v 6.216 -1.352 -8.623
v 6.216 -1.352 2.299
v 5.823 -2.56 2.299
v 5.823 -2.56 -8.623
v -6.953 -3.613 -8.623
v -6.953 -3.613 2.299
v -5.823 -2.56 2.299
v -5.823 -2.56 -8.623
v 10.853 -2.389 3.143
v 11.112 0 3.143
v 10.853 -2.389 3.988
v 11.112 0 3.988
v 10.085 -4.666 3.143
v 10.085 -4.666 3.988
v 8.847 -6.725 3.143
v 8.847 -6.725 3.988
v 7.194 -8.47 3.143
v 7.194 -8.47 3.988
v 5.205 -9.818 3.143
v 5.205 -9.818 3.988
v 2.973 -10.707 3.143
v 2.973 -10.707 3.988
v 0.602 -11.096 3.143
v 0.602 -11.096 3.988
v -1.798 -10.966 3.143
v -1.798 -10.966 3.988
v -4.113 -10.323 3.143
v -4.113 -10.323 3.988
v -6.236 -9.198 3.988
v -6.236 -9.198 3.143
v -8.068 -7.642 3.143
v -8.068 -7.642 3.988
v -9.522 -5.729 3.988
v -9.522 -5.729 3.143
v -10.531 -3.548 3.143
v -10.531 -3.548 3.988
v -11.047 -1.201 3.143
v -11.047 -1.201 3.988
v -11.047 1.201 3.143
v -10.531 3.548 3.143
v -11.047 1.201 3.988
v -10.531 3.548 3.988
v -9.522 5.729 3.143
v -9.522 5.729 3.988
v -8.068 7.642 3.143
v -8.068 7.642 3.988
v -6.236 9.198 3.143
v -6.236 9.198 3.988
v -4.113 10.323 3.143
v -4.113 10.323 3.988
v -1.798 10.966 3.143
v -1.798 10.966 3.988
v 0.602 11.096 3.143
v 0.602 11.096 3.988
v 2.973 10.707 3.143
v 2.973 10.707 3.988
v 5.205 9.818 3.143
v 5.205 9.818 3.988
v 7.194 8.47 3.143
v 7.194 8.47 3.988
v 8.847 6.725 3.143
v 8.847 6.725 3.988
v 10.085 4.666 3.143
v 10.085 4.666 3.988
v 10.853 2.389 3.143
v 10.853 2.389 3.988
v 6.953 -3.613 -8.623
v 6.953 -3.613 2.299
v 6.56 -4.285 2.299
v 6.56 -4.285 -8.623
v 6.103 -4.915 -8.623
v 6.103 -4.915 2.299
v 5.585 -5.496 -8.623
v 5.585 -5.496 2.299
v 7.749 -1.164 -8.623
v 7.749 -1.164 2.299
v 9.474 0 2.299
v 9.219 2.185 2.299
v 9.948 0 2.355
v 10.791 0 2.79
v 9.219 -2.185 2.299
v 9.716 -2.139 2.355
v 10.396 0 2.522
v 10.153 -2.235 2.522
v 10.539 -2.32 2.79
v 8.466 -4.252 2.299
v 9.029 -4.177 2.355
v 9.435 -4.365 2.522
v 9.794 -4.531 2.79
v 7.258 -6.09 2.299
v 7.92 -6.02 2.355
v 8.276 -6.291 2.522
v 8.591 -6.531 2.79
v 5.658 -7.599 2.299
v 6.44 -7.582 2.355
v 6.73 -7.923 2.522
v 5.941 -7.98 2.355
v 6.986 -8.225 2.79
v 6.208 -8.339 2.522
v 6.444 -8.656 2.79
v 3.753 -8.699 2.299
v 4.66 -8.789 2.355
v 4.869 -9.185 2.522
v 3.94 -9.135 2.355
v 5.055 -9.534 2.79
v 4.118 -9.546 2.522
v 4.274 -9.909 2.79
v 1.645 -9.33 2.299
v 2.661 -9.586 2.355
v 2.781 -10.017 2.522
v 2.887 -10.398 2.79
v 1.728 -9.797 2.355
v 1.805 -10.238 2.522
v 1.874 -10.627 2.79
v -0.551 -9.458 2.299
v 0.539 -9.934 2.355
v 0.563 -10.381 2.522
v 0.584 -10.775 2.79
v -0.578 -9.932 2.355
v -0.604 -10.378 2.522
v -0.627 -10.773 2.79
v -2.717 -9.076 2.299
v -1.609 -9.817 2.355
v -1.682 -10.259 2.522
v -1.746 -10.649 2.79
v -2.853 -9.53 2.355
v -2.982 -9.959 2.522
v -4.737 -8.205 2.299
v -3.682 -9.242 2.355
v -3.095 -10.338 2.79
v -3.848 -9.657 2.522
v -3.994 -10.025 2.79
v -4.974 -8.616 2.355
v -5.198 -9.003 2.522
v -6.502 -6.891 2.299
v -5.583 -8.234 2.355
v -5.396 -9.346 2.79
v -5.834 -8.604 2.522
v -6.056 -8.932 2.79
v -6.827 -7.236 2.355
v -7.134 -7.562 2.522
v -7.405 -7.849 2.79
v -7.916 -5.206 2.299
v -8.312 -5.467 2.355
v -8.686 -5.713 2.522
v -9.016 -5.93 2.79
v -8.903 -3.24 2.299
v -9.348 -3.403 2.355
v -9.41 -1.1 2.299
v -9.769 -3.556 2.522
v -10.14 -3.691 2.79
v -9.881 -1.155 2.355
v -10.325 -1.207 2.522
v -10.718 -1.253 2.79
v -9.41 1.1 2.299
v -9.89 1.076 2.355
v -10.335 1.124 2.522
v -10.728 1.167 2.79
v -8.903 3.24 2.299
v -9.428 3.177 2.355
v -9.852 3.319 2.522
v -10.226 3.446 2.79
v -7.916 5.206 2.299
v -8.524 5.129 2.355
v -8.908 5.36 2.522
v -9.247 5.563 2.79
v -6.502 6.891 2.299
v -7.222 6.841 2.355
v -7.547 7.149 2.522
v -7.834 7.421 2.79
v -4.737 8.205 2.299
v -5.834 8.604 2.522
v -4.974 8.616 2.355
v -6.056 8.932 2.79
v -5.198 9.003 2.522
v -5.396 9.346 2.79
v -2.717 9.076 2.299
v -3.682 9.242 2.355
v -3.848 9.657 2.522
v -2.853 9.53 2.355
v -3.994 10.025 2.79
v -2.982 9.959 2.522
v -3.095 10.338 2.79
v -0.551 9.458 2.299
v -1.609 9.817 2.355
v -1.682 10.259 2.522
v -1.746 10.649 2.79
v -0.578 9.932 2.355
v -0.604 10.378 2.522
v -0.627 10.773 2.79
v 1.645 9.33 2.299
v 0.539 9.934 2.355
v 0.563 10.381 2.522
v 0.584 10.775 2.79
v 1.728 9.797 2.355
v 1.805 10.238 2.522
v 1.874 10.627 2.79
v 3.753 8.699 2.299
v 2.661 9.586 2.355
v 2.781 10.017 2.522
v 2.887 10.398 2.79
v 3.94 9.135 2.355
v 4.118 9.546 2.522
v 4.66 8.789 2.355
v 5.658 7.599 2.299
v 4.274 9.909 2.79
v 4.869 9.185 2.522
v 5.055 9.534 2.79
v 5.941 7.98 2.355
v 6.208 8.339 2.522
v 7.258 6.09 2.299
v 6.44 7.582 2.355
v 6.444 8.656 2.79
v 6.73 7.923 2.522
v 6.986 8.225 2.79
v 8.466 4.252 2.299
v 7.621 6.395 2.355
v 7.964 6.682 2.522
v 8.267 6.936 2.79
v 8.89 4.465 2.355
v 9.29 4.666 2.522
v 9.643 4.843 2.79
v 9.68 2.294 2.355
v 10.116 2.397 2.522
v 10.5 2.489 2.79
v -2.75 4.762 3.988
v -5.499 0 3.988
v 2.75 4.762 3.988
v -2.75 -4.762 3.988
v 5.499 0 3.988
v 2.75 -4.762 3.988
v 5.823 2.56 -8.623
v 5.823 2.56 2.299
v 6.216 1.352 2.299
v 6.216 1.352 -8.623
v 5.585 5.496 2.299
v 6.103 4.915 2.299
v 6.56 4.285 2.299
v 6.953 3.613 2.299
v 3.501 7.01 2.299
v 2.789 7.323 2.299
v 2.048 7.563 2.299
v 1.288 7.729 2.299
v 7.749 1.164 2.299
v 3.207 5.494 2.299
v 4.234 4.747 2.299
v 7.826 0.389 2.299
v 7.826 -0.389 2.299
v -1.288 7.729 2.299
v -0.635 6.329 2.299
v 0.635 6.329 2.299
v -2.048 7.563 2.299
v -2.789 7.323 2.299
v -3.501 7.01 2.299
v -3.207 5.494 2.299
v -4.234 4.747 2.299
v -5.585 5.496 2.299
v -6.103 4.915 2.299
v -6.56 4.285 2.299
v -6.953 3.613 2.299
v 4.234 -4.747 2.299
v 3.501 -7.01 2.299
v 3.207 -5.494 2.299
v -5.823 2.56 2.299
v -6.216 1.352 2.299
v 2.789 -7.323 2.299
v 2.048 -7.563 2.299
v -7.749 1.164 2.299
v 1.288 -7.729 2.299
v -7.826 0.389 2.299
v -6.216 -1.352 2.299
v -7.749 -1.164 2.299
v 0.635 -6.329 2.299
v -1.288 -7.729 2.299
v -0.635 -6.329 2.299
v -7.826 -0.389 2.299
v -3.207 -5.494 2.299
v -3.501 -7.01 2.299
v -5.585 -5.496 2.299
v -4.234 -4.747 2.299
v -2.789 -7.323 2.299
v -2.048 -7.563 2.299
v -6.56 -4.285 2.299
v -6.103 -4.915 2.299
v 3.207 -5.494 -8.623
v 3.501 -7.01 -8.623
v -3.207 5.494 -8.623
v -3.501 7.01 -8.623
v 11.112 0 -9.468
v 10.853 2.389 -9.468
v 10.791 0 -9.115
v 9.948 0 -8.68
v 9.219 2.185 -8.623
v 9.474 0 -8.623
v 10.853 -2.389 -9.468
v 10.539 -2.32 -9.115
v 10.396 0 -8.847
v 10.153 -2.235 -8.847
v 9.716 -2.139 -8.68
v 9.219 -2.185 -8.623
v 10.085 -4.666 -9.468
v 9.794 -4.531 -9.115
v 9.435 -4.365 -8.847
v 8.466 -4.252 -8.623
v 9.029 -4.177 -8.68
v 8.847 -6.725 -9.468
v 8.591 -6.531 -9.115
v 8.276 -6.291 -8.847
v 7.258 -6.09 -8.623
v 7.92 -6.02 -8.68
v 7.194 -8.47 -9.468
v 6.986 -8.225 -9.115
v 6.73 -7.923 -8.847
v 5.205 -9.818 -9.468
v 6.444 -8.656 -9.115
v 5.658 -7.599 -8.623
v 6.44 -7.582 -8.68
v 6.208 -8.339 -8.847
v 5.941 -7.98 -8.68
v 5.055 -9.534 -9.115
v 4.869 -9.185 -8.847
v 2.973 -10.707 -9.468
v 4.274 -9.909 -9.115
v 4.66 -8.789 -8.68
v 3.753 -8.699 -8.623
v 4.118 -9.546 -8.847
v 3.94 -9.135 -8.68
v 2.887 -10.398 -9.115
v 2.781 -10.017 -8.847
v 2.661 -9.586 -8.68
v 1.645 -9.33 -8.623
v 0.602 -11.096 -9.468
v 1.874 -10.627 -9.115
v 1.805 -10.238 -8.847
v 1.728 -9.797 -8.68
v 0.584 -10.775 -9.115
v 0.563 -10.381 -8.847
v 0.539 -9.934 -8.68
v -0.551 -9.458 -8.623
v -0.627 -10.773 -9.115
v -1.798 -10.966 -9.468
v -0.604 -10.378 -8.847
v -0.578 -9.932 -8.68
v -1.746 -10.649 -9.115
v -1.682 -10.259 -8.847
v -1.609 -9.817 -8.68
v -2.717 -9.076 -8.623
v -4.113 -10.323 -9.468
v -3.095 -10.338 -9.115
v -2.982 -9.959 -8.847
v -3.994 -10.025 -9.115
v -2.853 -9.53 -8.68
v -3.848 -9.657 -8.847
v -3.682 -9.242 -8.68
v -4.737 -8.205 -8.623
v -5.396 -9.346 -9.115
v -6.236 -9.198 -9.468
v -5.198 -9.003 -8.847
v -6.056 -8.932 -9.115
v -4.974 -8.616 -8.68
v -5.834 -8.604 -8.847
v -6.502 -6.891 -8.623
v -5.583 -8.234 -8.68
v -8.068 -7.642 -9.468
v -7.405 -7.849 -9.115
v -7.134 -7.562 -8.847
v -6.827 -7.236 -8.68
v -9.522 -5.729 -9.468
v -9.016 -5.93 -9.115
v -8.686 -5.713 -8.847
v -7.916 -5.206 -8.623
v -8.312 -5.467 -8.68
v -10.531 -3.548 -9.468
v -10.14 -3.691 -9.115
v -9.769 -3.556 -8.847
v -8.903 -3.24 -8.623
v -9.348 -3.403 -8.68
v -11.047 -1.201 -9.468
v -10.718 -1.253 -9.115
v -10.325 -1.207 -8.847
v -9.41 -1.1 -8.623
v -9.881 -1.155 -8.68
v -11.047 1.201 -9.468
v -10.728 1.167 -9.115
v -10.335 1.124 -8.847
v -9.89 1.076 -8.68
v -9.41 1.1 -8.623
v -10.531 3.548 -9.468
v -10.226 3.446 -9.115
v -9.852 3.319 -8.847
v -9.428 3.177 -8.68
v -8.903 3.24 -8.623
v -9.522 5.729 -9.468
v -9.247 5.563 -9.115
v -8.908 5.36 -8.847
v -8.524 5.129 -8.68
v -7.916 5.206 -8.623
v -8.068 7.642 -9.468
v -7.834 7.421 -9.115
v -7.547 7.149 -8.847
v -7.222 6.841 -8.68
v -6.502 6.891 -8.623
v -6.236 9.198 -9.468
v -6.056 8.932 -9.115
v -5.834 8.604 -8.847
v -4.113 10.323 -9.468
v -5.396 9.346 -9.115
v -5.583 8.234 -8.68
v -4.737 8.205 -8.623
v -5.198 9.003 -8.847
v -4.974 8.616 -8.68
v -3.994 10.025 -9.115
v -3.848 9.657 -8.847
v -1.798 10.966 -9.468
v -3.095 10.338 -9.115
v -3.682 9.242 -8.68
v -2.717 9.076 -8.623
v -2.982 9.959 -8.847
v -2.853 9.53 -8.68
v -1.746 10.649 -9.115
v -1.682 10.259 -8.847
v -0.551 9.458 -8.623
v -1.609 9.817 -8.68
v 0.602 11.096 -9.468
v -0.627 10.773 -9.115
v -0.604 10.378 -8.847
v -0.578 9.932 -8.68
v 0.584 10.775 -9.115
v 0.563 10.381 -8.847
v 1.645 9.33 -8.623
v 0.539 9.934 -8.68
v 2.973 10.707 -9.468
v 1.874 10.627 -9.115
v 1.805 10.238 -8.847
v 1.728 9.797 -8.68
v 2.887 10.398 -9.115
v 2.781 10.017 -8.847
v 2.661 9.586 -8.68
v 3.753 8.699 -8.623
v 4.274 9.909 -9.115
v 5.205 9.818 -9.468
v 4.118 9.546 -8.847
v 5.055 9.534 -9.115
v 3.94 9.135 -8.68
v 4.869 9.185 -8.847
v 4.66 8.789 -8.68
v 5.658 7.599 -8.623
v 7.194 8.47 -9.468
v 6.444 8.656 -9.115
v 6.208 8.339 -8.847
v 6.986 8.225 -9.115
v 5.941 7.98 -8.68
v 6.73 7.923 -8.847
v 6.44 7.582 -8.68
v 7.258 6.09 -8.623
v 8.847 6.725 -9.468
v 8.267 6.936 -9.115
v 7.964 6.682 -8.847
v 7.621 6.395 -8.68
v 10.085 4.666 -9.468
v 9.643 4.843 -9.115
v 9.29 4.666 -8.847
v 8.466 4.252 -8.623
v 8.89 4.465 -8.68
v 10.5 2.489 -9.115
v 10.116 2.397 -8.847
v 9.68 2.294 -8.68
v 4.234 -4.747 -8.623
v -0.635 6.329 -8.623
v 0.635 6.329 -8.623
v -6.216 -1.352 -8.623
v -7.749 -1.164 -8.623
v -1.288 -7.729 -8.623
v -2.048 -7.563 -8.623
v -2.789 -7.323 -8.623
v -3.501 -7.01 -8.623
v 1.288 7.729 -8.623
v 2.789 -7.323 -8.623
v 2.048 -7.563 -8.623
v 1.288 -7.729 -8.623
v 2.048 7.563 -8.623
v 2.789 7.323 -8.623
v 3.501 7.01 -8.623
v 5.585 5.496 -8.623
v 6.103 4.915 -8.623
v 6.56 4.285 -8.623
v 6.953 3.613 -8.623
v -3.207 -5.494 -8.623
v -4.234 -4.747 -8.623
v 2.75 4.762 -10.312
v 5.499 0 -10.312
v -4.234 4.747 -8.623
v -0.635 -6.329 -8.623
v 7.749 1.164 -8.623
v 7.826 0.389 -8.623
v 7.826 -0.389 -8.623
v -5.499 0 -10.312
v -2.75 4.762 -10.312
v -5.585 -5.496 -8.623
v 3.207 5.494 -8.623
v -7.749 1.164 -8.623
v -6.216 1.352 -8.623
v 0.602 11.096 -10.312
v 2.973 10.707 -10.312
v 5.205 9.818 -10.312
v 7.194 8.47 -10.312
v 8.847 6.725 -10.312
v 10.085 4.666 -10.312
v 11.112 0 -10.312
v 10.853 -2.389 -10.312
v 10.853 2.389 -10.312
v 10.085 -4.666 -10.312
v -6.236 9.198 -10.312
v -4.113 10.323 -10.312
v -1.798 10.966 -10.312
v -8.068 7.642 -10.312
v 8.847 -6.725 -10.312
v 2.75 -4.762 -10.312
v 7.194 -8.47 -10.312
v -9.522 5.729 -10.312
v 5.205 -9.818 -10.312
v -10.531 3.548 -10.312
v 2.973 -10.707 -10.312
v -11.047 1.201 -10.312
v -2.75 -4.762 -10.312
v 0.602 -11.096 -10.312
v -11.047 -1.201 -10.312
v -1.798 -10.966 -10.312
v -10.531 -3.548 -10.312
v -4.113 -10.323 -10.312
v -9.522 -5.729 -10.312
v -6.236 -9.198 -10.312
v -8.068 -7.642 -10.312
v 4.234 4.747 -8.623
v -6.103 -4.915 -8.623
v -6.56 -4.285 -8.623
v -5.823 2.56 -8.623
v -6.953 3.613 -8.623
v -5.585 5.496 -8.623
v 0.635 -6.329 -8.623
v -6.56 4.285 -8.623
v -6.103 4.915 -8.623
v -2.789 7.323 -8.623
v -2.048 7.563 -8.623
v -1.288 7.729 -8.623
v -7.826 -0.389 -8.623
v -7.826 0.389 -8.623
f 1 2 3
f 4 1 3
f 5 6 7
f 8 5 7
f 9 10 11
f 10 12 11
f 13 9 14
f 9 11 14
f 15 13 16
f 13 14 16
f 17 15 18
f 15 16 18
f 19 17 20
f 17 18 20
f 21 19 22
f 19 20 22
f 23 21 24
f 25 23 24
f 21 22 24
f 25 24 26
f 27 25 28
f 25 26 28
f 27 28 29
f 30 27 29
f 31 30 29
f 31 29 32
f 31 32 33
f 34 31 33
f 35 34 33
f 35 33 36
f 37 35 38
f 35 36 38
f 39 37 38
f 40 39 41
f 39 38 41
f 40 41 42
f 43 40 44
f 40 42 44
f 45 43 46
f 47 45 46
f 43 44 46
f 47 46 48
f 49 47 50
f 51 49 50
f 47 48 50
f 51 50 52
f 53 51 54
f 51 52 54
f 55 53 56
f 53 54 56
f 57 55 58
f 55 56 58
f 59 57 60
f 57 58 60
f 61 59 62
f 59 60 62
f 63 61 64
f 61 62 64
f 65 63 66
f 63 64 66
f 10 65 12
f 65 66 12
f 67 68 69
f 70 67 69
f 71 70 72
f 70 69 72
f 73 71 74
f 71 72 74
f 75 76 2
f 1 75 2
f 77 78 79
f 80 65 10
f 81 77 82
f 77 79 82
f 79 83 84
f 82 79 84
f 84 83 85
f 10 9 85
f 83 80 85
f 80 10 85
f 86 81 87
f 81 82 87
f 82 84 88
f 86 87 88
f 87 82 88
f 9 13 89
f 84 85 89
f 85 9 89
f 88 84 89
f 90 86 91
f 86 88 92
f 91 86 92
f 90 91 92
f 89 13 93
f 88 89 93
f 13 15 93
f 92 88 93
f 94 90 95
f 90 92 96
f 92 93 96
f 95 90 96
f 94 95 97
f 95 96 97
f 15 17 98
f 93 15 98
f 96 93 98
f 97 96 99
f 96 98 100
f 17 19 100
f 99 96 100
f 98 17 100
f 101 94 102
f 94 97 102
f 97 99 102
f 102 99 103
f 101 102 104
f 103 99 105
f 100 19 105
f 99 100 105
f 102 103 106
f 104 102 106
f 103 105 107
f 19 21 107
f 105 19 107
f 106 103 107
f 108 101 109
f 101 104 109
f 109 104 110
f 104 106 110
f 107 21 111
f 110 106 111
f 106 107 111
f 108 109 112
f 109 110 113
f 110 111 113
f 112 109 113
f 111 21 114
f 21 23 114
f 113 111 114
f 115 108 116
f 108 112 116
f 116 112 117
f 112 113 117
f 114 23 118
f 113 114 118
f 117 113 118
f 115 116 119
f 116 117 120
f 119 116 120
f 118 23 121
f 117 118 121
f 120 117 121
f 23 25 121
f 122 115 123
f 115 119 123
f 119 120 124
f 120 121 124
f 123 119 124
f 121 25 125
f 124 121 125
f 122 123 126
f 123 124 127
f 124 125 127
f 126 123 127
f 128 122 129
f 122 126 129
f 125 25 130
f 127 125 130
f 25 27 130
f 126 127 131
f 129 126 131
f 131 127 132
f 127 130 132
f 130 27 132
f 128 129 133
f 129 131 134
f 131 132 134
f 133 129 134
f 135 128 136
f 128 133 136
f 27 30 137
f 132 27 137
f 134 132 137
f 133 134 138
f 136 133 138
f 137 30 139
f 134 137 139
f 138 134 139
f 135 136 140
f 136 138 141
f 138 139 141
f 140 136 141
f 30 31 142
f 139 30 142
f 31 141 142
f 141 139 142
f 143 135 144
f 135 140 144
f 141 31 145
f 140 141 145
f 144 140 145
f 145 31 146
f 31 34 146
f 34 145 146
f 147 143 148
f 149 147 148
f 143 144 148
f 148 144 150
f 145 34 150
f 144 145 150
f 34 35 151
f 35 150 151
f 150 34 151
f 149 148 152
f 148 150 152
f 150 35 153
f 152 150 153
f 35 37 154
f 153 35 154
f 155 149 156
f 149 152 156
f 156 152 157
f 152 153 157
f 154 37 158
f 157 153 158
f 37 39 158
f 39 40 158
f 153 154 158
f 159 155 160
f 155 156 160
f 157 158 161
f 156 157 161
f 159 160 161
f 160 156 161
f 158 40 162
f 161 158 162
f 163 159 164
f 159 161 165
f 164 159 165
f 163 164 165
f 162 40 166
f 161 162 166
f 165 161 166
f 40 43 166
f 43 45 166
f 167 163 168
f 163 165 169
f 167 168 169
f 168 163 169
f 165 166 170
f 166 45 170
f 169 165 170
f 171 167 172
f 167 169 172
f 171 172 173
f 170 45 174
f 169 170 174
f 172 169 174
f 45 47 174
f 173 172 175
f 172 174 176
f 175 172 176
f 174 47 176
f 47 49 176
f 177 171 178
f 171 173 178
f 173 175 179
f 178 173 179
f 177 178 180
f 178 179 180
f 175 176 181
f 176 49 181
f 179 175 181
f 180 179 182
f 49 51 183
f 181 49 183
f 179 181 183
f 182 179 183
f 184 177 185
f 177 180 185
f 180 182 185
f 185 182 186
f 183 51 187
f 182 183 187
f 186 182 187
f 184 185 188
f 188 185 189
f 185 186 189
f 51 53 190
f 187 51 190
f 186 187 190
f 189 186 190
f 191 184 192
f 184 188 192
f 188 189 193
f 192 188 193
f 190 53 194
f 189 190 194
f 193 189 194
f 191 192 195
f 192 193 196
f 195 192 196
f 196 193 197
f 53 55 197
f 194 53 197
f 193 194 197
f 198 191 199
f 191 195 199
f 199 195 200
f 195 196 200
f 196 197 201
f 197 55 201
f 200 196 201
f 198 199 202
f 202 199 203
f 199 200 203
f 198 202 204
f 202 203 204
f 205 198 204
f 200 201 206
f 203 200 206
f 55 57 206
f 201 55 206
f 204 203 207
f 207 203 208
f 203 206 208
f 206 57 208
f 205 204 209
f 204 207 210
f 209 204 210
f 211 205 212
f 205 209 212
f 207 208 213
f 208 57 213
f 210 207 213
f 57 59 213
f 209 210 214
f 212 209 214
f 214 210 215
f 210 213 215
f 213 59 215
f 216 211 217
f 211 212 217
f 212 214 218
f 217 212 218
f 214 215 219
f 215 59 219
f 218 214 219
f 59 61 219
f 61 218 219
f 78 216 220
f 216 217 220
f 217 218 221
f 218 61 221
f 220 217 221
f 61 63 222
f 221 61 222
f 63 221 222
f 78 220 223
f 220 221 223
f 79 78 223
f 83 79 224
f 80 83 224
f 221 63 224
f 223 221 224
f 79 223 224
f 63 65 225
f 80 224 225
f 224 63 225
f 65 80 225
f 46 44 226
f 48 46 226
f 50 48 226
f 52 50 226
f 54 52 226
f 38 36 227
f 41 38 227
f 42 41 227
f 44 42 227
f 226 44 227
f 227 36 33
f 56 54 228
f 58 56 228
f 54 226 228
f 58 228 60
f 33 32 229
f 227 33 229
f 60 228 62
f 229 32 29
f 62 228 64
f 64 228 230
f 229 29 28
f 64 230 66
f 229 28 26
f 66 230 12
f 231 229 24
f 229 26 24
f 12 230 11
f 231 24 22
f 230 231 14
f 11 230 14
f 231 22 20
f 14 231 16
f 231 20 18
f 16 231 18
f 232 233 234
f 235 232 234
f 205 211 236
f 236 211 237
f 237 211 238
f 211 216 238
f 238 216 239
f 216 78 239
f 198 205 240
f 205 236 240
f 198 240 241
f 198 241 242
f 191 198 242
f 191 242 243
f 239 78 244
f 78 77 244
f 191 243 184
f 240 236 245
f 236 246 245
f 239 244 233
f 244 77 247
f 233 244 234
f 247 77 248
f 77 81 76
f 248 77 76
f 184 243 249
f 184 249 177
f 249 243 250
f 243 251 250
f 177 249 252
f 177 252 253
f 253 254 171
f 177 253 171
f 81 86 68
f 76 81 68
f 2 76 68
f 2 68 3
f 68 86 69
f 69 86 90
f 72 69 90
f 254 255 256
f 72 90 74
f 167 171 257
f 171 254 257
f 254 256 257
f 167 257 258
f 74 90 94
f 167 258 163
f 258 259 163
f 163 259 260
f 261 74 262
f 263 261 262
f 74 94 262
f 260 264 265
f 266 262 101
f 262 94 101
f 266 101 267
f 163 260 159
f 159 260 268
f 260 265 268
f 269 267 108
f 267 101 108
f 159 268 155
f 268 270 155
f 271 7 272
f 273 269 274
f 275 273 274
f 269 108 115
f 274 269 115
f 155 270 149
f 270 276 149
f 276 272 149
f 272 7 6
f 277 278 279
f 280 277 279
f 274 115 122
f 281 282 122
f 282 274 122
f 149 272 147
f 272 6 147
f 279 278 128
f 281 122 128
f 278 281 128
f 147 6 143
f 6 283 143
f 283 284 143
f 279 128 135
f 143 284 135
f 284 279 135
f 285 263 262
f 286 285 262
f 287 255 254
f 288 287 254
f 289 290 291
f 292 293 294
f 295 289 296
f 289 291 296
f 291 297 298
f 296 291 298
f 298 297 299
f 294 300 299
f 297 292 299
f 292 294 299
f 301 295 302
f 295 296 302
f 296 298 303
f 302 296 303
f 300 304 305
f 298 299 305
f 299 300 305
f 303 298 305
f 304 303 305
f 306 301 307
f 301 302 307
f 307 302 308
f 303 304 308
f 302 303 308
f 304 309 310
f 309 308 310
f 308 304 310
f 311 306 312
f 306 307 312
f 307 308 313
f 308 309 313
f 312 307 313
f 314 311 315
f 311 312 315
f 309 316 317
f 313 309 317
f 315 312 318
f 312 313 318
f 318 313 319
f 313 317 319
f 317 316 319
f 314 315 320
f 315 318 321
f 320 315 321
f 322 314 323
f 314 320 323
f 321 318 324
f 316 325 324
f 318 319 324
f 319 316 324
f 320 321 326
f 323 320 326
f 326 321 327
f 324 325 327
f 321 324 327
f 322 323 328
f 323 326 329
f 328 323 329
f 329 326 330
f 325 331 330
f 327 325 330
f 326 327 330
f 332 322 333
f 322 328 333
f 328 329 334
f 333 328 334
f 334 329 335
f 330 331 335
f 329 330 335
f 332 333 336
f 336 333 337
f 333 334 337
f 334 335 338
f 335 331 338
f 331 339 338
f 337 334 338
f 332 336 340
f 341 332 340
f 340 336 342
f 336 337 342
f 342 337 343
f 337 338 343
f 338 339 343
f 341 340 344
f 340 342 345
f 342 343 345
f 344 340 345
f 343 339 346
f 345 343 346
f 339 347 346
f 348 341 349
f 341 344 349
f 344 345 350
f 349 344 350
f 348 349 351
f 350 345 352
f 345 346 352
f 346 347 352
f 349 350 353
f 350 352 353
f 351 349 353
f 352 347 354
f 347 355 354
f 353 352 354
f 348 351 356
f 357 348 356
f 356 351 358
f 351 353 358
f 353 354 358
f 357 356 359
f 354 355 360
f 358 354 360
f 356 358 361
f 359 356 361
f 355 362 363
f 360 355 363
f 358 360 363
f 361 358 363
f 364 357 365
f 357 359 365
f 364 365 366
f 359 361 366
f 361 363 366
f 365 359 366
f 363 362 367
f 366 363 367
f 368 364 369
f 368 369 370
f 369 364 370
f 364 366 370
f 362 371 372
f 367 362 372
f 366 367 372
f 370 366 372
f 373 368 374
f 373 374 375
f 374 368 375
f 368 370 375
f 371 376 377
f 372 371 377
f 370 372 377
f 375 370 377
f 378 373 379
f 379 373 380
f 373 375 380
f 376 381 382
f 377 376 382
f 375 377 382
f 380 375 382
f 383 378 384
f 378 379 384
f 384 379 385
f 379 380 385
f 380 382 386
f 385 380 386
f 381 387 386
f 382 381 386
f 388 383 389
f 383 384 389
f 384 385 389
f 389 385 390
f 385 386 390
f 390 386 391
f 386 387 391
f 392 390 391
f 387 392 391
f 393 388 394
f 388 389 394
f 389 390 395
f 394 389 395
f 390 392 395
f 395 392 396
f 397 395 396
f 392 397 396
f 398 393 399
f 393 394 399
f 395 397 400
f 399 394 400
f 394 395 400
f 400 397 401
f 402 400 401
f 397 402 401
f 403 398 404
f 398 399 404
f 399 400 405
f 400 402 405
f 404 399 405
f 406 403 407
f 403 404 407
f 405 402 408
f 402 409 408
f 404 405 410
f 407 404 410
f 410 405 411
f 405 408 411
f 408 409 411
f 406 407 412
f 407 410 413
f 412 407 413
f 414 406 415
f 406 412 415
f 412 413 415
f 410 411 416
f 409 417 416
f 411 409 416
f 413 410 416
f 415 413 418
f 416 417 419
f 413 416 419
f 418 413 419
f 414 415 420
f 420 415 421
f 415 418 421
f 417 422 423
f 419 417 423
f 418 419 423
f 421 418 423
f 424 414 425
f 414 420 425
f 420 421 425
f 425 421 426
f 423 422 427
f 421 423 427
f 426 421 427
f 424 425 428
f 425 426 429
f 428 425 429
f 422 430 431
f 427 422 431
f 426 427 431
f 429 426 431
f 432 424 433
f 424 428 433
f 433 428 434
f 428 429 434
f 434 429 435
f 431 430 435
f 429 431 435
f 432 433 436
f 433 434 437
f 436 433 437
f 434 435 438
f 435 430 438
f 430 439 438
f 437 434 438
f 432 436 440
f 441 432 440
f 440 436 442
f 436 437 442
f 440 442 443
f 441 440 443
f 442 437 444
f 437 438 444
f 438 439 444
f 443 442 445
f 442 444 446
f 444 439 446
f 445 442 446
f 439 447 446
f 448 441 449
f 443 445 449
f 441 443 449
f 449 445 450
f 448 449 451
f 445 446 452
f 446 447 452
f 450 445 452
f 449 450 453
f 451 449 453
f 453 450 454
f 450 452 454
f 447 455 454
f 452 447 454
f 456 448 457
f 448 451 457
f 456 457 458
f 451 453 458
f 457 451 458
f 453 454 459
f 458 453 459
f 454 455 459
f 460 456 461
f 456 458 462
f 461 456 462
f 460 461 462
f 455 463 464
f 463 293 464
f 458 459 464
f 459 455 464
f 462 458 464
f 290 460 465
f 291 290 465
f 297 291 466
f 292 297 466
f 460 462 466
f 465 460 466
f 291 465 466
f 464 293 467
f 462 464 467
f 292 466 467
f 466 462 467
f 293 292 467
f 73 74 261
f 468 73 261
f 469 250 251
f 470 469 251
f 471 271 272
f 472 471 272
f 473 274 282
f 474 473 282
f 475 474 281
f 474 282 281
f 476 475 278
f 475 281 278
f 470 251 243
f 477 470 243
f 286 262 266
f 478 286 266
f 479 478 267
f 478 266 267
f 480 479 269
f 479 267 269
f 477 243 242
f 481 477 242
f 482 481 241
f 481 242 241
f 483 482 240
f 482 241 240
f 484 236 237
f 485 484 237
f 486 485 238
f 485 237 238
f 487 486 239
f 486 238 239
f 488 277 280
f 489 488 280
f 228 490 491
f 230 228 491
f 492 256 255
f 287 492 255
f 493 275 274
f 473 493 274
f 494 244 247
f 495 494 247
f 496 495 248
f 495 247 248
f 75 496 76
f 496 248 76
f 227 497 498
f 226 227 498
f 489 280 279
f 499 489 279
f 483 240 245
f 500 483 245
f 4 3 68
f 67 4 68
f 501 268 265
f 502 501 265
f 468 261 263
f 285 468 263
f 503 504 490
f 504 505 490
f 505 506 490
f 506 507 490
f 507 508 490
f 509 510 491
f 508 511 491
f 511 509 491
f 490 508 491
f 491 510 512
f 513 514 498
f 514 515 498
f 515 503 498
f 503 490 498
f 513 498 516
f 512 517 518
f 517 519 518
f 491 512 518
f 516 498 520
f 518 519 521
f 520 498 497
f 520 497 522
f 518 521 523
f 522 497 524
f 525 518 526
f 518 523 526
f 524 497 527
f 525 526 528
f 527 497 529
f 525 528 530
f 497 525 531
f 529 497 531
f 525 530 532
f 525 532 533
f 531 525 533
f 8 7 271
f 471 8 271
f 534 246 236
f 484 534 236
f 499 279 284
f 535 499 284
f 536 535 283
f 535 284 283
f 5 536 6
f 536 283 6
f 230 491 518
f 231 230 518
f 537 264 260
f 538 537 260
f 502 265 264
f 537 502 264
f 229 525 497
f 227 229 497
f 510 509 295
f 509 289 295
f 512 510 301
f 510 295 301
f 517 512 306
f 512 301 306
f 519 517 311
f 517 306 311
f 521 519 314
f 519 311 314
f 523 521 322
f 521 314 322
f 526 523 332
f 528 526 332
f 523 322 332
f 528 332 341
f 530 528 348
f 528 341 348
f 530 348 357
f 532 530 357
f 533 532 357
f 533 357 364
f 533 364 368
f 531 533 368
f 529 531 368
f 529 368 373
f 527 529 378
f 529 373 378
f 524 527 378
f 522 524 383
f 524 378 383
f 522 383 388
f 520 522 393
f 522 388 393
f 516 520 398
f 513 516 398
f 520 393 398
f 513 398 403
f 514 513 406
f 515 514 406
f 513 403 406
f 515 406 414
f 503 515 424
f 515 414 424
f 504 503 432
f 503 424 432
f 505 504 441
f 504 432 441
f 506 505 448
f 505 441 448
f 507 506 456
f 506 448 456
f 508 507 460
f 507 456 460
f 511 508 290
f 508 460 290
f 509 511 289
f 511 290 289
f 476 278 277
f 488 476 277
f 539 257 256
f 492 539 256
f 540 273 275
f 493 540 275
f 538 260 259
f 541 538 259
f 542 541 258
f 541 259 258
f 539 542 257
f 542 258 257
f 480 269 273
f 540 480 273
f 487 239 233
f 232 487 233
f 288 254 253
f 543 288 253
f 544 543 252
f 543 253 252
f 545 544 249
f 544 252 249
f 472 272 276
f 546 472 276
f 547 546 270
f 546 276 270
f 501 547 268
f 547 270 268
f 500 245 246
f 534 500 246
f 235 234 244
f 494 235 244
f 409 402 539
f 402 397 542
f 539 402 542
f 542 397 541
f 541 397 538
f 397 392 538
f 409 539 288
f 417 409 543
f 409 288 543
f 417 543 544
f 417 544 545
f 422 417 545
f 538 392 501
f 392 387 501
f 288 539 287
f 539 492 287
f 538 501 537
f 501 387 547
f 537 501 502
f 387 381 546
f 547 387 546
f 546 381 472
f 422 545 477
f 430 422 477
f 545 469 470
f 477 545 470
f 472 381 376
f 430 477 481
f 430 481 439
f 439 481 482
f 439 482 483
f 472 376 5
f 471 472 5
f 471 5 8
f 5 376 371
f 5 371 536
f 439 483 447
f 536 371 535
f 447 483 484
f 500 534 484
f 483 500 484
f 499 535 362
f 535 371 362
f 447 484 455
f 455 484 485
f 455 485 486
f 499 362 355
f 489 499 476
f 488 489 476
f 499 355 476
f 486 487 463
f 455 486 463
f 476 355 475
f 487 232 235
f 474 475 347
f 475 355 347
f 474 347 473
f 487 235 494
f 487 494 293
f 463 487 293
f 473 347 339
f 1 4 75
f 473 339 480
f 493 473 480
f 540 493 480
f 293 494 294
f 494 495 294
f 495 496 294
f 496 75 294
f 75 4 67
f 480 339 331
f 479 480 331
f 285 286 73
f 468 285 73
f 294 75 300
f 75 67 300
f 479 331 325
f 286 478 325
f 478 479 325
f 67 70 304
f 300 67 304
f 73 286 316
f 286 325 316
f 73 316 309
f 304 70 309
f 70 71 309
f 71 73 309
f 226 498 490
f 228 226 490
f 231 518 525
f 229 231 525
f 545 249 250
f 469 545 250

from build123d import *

# Parameters (mm, degrees)
CUT_EXTRUDE1_START = 2.2987
CUT_EXTRUDE1_DEPTH = 10.922
CIRPATTERN1_COUNT  = 10
CUT_EXTRUDE2_DEPTH = 25.654


with BuildPart() as part:
    # Sketch2 → Revolve1 (revolve)
    with BuildSketch(Plane(origin=(0, 0, 0), x_dir=(0, 0, -1), z_dir=(1, 0, 0)), mode=Mode.PRIVATE) as revolve1_sk:
        with BuildLine():
            Line((-3.9878, 2.5), (10.3124, 2.5))
            Line((10.3124, 2.5), (10.3124, 11.1125))
            Line((10.3124, 11.1125), (9.46785, 11.1125))
            ThreePointArc((9.46785, 11.1125), (8.846862309, 10.395787163), (8.6233, 9.4742))
            Line((8.6233, 9.4742), (8.6233, 7.8359))
            Line((8.6233, 7.8359), (-2.2987, 7.8359))
            Line((-2.2987, 7.8359), (-2.2987, 9.4742))
            ThreePointArc((-2.2987, 9.4742), (-2.522262309, 10.395787163), (-3.14325, 11.1125))
            Line((-3.14325, 11.1125), (-3.9878, 11.1125))
            Line((-3.9878, 11.1125), (-3.9878, 2.5))
        make_face()
    revolve(revolve1_sk.sketch.rotate(Axis((0, 0, 10.3124), (0, 0, -1)), 90), axis=Axis((0, 0, 10.3124), (0, 0, -1)))

    # Sketch3 → Cut-Extrude1 (cut)
    with BuildSketch(Plane.XY.offset(CUT_EXTRUDE1_START)):
        with BuildLine():
            Line((-0.635, 6.329348022), (0.635, 6.329348022))
            Line((0.635, 6.329348022), (1.287830721, 7.729348022))
            ThreePointArc((1.287830721, 7.729348022), (0, 7.8359), (-1.287830721, 7.729348022))
            Line((-1.287830721, 7.729348022), (-0.635, 6.329348022))
        make_face()
    cut_extrude1 = extrude(amount=-CUT_EXTRUDE1_DEPTH, mode=Mode.SUBTRACT)

    # CirPattern1: Cut-Extrude1 ×10 about axis
    cirpattern1_axis = Axis((0, 0, 0), (0, 0, 1))
    for i in range(1, CIRPATTERN1_COUNT):
        add(cut_extrude1.rotate(cirpattern1_axis, i * 360 / CIRPATTERN1_COUNT), mode=Mode.SUBTRACT)

    # Sketch6 → Cut-Extrude2 (cut)
    with BuildSketch(Plane(origin=(0, 0, -10.3124), x_dir=(-1, 0, 0), z_dir=(0, 0, -1))):
        Polygon((5.499261314, 0), (2.749630657, 4.7625), (-2.749630657, 4.7625), (-5.499261314, 0), (-2.749630657, -4.7625), (2.749630657, -4.7625), align=None)
    extrude(amount=-CUT_EXTRUDE2_DEPTH, mode=Mode.SUBTRACT)


solid = part.part
